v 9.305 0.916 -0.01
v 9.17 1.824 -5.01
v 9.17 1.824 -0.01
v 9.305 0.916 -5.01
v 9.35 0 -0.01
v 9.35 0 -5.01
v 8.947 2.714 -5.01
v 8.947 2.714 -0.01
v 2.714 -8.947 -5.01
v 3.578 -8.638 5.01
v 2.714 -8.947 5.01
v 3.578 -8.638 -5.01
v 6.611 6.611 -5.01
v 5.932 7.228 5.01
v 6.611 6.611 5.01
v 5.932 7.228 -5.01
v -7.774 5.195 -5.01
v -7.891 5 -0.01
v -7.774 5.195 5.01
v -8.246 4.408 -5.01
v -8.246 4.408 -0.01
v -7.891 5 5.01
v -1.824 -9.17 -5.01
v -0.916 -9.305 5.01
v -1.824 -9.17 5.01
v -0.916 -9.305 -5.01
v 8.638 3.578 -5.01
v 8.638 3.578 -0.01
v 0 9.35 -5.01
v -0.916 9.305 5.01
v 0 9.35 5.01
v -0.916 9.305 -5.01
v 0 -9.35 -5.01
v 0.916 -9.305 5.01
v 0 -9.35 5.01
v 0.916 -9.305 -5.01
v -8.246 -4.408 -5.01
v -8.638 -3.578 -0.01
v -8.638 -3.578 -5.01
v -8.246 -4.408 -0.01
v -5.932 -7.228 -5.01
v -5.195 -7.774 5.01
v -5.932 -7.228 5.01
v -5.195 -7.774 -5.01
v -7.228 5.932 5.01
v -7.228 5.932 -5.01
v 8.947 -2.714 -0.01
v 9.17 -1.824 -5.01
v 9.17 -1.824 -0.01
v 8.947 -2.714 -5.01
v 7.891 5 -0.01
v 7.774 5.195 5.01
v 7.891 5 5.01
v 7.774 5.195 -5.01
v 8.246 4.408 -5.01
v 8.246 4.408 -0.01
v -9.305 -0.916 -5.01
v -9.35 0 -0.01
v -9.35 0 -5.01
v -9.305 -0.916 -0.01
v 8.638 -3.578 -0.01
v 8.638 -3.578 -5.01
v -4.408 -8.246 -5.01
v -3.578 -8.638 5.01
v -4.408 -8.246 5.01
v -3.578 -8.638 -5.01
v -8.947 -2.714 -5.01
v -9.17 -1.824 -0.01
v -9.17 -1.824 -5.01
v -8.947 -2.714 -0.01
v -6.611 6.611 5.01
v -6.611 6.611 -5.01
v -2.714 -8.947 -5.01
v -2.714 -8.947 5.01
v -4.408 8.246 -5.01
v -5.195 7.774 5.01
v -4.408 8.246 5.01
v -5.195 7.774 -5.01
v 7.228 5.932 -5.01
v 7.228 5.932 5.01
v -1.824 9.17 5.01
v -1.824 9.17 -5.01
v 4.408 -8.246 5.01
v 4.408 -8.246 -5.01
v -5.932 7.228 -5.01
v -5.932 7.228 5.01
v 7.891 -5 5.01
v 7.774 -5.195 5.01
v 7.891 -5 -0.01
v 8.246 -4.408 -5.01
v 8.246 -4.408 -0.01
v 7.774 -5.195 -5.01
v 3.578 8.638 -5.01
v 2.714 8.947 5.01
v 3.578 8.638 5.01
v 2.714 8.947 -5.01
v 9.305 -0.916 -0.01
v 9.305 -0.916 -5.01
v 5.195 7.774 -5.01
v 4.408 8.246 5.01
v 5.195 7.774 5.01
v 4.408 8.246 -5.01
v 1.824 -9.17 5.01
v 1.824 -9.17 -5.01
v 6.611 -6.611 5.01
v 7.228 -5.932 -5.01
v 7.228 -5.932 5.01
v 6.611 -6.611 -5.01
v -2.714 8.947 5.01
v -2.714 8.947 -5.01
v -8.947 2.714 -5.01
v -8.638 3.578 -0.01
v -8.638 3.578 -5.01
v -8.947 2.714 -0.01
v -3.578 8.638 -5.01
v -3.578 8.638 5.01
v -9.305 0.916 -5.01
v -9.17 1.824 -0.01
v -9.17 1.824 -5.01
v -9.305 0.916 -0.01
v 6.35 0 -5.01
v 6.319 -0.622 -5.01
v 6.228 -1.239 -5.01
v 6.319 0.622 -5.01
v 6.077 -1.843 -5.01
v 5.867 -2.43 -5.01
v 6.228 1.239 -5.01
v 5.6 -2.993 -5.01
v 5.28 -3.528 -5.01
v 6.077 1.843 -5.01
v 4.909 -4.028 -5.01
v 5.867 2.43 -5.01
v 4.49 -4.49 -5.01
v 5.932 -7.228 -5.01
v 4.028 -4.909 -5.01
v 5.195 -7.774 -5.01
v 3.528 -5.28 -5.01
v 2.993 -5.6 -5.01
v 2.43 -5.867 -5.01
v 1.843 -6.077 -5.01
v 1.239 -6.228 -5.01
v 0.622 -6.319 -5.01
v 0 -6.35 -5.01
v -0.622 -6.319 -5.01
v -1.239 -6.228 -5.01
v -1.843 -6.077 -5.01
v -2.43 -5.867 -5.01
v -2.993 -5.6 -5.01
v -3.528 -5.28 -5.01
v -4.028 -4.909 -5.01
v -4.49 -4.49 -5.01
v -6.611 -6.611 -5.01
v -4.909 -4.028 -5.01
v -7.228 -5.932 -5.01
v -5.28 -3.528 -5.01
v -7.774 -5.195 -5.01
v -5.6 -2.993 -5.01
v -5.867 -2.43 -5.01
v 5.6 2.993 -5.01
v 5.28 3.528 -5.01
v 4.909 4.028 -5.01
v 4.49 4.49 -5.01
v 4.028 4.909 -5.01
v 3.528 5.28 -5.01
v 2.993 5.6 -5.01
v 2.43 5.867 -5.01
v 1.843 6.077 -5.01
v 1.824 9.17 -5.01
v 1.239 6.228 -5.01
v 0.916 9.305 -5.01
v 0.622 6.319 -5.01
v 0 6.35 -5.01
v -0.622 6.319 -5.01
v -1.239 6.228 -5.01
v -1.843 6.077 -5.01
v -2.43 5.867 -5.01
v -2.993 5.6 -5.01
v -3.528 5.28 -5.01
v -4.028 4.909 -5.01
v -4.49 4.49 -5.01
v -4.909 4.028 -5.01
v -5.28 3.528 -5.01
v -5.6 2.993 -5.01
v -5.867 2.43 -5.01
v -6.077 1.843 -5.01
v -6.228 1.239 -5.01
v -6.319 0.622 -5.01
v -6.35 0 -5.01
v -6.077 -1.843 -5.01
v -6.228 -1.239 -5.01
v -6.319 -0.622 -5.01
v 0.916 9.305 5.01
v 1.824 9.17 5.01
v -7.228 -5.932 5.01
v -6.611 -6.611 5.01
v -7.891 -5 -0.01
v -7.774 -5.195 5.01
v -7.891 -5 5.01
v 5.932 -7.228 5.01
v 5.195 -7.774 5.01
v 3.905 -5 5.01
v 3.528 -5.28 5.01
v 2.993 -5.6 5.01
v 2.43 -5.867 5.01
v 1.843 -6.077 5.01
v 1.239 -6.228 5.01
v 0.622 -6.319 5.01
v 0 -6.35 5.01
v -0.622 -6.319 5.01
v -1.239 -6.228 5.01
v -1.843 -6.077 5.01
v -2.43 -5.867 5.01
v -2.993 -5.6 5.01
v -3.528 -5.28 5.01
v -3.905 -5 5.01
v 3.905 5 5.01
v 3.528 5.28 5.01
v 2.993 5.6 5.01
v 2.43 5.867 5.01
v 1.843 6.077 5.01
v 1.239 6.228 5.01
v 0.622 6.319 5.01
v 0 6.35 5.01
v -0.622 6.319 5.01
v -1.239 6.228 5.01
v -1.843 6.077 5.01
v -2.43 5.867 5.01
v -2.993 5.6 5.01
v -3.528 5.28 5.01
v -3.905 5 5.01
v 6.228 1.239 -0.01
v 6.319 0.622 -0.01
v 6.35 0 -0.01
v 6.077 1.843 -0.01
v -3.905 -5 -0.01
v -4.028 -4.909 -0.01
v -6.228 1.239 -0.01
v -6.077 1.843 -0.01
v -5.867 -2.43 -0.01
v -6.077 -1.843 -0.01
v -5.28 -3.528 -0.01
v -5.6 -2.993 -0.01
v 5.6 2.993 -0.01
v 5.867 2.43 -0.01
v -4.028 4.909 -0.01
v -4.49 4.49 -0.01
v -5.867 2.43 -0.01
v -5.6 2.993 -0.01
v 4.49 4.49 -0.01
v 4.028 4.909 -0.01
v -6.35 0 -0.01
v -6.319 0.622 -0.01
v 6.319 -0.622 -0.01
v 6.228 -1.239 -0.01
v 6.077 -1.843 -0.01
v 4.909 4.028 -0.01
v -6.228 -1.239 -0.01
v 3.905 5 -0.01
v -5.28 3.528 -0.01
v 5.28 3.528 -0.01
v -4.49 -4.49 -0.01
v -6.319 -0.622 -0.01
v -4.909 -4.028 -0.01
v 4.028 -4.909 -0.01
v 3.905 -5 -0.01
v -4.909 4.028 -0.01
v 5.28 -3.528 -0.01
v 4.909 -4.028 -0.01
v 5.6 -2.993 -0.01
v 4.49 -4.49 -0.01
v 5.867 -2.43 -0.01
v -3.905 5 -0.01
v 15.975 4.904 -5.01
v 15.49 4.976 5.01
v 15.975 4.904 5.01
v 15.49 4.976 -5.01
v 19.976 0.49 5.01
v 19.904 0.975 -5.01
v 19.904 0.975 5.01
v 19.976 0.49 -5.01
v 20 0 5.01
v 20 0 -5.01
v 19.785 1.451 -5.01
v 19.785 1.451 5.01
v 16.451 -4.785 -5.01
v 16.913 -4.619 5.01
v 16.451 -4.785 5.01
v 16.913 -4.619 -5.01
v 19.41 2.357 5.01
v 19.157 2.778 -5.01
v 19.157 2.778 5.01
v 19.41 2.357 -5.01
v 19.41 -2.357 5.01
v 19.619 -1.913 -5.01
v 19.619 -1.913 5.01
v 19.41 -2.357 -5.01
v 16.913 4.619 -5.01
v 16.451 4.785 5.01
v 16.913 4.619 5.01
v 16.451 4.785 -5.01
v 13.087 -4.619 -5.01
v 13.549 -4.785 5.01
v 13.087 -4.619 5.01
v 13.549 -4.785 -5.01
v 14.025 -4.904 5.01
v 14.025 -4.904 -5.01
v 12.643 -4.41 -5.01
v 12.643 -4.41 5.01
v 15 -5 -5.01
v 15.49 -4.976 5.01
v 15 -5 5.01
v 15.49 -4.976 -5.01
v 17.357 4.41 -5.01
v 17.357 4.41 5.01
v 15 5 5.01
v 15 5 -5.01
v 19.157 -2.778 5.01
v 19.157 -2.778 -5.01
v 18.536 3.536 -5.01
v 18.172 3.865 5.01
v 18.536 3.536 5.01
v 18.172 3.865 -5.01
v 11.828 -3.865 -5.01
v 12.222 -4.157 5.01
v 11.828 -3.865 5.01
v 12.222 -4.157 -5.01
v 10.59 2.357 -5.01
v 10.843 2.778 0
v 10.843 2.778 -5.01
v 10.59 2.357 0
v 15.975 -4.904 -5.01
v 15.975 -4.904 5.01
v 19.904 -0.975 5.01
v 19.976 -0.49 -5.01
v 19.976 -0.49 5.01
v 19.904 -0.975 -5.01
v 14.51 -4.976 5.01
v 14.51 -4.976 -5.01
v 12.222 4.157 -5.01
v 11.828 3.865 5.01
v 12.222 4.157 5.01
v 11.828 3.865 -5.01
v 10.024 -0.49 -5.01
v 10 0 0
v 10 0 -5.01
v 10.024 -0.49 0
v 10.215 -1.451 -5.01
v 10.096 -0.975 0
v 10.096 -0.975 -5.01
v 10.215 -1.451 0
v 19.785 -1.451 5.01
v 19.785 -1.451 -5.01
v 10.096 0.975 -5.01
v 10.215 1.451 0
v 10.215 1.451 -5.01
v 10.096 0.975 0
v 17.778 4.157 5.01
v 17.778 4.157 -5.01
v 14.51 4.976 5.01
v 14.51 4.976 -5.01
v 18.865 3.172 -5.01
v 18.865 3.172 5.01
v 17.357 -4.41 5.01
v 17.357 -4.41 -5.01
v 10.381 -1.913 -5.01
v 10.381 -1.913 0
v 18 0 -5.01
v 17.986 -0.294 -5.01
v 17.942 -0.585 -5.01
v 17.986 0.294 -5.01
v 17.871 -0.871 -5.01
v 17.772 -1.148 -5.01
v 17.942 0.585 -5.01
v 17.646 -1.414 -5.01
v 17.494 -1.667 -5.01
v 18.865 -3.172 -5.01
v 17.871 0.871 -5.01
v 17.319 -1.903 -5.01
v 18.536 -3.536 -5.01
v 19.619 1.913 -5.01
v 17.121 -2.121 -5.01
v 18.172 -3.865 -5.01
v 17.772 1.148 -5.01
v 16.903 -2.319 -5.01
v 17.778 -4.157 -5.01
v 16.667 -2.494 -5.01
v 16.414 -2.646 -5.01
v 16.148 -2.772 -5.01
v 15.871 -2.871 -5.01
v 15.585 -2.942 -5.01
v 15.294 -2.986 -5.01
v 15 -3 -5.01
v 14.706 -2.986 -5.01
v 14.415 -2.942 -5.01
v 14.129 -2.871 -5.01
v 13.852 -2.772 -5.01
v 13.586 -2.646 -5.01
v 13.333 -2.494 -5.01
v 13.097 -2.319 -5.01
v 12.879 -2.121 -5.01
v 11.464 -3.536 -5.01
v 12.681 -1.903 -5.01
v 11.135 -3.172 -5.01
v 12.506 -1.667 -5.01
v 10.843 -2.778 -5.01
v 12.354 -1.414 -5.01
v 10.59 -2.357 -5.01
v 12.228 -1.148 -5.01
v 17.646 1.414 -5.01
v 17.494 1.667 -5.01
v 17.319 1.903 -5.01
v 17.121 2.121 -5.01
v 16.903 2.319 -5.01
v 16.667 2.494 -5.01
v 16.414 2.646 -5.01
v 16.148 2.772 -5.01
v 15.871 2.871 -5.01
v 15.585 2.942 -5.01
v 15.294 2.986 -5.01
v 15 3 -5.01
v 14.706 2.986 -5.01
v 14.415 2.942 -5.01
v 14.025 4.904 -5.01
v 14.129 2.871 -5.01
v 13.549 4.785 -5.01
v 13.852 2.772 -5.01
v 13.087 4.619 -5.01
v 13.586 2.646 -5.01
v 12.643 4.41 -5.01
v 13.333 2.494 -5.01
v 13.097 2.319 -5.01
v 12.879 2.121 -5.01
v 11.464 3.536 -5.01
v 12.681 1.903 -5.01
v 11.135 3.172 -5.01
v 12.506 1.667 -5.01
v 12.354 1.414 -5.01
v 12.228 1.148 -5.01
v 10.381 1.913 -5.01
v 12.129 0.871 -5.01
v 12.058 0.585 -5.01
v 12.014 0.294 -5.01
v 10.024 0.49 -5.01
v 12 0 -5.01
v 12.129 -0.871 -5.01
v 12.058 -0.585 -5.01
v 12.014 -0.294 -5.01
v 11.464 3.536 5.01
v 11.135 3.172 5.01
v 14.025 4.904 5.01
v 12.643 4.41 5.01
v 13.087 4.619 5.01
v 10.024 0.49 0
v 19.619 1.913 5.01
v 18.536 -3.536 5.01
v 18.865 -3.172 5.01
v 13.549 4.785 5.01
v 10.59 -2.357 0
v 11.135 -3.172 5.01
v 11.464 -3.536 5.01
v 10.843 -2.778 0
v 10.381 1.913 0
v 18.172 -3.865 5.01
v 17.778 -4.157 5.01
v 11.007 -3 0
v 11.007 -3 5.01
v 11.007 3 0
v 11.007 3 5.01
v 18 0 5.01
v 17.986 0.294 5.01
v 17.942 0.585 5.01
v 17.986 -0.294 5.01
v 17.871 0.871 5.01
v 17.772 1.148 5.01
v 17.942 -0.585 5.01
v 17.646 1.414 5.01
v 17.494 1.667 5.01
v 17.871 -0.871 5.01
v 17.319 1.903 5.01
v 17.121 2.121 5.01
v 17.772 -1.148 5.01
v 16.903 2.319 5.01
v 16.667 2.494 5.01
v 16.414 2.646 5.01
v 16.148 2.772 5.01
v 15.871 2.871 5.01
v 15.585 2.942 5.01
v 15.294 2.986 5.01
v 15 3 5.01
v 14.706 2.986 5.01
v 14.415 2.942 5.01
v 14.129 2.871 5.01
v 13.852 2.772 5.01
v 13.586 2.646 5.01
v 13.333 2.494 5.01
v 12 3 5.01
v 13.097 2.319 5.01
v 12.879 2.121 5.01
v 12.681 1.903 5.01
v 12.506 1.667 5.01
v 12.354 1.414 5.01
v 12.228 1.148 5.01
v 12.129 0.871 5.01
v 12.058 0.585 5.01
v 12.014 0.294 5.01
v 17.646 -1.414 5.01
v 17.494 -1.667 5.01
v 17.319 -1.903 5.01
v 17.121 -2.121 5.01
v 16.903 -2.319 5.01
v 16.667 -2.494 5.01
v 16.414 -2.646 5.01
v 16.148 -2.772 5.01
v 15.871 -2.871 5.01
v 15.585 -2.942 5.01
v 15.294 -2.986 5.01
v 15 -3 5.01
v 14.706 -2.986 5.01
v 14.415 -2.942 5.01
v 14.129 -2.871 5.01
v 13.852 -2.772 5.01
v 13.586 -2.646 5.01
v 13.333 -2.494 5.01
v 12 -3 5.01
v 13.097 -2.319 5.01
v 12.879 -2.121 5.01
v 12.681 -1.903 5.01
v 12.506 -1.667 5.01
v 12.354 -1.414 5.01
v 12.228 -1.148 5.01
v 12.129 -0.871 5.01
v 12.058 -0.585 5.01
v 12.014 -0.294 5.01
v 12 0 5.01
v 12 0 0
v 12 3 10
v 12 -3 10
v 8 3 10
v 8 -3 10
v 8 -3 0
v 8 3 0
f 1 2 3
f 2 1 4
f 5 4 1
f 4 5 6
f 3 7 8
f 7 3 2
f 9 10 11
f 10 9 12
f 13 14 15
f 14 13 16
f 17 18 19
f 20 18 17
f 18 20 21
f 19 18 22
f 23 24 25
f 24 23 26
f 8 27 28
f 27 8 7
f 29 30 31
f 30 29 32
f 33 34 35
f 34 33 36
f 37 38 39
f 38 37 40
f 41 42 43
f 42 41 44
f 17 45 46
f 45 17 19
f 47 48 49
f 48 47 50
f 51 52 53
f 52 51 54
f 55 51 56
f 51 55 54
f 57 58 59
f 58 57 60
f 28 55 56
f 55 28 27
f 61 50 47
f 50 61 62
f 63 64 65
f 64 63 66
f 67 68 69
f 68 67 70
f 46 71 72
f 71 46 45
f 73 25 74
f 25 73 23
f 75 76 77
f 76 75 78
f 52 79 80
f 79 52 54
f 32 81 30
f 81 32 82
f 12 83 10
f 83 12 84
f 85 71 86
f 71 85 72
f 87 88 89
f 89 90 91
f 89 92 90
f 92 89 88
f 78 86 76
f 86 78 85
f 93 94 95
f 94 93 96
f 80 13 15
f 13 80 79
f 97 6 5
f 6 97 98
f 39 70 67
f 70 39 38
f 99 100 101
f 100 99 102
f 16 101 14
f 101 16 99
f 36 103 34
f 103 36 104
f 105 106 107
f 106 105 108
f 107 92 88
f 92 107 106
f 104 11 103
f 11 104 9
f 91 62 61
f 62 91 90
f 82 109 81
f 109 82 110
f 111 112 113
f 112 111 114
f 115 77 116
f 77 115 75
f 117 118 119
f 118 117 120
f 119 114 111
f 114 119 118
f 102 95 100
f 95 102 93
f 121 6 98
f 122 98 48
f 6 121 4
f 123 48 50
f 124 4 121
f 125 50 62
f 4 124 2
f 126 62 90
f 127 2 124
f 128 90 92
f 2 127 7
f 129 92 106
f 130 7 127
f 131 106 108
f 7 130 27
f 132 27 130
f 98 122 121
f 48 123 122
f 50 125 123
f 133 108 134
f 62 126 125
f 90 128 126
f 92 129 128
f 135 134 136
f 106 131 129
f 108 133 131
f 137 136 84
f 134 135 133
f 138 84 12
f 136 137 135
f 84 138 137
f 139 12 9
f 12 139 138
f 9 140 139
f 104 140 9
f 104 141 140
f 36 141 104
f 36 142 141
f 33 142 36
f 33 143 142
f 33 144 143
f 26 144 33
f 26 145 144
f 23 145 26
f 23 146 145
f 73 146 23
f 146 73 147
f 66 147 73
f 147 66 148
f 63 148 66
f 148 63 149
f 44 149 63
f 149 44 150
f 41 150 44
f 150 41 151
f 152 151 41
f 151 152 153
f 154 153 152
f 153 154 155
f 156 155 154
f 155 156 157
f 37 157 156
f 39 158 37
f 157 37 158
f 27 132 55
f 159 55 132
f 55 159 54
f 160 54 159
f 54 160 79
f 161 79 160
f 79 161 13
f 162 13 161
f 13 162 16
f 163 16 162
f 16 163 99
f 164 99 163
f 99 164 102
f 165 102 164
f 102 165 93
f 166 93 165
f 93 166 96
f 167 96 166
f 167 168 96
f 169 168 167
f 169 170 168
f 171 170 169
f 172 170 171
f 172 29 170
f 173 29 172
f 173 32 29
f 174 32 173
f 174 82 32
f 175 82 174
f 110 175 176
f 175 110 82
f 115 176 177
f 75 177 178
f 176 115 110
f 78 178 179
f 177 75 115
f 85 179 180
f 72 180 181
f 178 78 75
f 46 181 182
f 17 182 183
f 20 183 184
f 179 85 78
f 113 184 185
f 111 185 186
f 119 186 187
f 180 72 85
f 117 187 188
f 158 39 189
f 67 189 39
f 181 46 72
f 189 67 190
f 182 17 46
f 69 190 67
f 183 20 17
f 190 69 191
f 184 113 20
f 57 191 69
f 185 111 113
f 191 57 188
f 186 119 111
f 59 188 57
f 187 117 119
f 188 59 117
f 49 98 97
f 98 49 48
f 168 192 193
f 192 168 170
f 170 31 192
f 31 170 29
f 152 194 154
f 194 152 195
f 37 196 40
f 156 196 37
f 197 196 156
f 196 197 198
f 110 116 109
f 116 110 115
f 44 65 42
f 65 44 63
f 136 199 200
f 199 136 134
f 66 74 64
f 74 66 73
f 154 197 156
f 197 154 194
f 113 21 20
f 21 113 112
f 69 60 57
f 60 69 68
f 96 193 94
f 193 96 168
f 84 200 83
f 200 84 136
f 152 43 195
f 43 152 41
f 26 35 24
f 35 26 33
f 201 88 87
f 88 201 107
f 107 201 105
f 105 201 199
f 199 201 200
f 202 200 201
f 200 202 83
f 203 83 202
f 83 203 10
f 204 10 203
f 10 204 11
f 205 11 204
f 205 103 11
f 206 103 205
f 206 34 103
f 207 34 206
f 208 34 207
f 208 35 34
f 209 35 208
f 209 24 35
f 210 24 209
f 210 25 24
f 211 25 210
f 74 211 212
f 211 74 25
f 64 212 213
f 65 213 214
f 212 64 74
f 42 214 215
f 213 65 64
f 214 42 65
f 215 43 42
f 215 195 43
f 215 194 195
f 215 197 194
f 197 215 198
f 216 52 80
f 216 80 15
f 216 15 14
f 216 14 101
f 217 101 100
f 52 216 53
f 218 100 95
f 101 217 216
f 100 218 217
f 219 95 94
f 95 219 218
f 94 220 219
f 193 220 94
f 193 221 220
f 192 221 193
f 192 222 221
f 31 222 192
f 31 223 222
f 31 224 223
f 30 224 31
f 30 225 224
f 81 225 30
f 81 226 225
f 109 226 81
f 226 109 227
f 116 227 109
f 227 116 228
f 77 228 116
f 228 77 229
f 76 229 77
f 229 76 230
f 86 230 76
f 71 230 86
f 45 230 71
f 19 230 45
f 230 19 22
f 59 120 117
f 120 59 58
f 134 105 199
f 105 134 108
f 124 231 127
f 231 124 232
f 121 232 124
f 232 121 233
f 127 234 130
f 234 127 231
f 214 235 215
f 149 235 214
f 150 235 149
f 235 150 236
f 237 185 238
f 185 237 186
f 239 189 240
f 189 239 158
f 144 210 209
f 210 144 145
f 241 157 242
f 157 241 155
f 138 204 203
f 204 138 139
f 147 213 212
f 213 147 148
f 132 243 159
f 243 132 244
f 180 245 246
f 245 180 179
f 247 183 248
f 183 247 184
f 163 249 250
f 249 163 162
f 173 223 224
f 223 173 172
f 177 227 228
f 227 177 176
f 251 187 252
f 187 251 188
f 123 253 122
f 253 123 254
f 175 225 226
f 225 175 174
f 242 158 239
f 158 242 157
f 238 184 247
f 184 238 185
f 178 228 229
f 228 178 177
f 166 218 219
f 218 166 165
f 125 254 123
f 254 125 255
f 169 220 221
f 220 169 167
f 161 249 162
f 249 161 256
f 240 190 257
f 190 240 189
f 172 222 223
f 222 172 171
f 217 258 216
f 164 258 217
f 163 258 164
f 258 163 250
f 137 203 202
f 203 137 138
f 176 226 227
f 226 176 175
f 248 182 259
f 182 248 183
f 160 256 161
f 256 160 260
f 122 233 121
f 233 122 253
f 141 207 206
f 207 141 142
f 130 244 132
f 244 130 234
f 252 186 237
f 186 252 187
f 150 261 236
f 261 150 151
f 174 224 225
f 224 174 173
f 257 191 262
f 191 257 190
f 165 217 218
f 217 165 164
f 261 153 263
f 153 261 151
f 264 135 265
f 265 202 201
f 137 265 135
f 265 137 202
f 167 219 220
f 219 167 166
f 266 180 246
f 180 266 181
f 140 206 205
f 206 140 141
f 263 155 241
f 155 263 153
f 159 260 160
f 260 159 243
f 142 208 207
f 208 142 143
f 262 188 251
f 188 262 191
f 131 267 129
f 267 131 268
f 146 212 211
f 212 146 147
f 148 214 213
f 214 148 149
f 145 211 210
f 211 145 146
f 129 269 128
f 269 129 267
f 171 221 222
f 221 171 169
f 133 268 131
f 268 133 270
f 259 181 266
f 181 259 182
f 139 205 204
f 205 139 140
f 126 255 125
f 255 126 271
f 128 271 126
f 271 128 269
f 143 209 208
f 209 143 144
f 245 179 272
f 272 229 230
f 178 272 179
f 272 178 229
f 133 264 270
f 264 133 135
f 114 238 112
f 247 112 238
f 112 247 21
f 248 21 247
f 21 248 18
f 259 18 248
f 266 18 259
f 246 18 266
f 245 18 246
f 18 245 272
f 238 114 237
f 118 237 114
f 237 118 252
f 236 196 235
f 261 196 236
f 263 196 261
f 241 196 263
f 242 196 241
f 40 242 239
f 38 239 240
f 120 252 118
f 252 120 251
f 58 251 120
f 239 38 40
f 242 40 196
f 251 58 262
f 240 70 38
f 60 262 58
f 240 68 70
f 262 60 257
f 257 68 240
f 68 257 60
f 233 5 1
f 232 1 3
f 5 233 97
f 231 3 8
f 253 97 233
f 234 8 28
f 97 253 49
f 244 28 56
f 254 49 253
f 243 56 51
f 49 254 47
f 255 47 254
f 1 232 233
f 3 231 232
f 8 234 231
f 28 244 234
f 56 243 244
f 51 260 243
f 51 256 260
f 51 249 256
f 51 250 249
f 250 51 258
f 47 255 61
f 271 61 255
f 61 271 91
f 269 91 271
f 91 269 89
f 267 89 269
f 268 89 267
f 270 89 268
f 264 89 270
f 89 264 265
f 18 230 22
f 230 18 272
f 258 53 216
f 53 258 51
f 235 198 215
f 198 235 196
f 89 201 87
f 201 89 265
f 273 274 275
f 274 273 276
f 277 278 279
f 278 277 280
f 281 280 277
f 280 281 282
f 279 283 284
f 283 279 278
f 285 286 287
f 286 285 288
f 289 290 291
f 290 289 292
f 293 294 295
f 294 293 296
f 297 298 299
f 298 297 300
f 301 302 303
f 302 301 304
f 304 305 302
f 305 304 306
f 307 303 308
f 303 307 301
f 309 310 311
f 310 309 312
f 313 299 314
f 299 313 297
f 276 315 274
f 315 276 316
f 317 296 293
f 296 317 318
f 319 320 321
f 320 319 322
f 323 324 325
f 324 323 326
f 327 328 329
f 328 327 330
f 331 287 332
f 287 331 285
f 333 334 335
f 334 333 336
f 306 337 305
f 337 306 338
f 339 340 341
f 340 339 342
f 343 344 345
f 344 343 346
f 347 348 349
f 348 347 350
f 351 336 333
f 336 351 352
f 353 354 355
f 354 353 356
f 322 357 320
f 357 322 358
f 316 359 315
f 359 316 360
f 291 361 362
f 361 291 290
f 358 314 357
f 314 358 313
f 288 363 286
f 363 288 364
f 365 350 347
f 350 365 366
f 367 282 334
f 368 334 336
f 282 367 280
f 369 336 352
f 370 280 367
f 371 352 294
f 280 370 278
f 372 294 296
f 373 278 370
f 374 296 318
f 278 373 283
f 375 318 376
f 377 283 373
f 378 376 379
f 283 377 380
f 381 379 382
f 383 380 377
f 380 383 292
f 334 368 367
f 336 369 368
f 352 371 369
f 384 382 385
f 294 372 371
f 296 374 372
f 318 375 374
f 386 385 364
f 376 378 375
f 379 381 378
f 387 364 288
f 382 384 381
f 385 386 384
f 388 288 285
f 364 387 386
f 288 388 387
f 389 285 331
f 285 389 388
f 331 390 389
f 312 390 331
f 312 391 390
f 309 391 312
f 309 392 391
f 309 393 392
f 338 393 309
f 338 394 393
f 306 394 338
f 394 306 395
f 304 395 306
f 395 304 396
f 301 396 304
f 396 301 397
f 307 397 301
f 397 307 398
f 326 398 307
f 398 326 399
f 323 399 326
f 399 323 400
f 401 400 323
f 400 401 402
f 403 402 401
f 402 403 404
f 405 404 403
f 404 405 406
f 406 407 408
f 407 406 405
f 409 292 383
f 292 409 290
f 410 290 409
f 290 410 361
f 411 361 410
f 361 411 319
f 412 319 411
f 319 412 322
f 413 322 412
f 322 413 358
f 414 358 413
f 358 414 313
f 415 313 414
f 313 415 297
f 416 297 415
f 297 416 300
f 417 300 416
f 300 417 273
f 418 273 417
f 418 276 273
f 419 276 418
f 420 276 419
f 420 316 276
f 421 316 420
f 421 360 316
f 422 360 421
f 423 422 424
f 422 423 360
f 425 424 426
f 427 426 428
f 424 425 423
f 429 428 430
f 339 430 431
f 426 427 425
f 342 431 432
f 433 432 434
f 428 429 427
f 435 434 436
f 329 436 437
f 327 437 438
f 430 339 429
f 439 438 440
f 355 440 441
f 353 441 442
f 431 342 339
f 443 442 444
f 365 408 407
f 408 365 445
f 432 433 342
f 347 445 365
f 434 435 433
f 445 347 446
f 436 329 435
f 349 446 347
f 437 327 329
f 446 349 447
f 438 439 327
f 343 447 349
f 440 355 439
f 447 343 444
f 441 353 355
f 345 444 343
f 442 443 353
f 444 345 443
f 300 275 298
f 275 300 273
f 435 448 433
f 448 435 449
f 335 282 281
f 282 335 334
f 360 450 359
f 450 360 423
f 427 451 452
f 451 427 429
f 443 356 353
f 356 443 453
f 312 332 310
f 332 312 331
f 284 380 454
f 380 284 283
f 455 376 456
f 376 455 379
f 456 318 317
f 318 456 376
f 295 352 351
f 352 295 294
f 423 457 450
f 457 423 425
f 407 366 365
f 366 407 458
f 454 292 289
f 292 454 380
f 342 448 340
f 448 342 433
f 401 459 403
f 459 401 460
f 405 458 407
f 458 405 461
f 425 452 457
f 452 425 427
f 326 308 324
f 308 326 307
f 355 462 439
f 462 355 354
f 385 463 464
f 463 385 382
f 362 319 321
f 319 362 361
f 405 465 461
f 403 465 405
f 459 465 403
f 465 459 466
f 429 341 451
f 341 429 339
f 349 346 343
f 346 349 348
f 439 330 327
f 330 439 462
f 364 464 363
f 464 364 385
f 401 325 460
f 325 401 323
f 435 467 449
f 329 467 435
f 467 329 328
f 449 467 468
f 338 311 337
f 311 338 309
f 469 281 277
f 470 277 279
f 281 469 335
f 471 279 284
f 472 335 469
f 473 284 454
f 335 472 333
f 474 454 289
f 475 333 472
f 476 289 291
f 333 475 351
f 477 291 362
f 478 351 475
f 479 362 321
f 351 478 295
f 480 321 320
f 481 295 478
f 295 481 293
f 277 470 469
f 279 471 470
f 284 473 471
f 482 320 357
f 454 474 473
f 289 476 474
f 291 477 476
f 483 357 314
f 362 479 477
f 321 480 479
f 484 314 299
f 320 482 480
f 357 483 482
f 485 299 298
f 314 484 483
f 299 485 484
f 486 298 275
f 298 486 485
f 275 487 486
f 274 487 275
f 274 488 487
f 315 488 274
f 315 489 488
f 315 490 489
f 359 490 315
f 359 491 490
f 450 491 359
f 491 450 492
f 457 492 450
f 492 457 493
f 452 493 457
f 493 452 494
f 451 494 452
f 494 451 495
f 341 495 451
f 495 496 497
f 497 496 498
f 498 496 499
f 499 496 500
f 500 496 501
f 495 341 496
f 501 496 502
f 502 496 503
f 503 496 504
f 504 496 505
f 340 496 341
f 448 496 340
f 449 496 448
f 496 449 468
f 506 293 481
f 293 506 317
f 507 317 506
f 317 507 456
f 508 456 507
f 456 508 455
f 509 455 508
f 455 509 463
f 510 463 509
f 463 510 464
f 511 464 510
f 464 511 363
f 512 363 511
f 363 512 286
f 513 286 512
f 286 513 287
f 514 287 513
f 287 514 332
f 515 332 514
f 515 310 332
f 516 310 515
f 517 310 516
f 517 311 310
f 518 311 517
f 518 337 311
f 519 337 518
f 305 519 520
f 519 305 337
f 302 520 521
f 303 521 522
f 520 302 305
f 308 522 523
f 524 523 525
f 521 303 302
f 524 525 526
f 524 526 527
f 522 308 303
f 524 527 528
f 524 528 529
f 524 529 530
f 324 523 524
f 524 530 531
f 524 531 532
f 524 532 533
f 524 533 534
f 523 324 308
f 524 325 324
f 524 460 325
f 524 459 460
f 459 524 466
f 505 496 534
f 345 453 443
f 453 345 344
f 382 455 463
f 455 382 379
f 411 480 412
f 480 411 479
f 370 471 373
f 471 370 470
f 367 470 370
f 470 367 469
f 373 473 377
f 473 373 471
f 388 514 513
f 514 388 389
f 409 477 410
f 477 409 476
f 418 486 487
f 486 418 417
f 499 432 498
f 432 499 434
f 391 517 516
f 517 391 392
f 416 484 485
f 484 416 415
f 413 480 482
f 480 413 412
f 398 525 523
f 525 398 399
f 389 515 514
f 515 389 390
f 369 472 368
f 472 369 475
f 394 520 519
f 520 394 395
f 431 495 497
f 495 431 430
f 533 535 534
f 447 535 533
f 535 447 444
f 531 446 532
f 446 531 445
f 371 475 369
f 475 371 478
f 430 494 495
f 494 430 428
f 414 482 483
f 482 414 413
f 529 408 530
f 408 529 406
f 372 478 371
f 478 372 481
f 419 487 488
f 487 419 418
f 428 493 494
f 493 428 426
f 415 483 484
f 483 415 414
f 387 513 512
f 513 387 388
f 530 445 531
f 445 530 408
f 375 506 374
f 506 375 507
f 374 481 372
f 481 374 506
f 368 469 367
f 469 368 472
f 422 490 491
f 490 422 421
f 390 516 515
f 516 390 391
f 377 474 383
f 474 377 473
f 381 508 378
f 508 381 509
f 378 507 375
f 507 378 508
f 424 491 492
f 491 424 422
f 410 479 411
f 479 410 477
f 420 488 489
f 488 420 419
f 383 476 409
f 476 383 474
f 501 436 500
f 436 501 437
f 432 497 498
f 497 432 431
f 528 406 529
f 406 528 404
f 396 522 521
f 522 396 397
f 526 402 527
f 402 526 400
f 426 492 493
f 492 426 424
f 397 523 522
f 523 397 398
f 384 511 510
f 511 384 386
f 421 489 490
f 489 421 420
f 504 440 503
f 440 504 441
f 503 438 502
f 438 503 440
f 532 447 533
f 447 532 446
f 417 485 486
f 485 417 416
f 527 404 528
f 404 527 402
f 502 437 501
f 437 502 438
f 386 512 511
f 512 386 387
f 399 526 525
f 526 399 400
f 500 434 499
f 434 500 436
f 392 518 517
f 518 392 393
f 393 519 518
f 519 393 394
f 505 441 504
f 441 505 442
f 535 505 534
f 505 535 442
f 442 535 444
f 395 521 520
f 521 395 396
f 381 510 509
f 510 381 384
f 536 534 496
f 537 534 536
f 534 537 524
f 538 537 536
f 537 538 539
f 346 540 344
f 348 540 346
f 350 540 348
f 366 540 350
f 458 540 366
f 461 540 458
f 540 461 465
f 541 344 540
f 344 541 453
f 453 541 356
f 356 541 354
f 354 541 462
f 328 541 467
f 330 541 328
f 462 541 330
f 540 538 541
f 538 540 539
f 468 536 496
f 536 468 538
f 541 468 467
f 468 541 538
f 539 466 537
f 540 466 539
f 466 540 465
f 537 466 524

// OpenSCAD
$fn = 64;

// Dimensions
rod_id = 12.7;        // inner diameter of rod ring (mm)
rod_wall = 3;         // wall thickness of rod ring (mm)
rod_od = rod_id + 2 * rod_wall;  // outer diameter of rod ring (mm)
rod_opening_width = 10;  // width of opening cut from -X side (mm)

tubing_id = 6;        // inner diameter of tubing ring (mm)
tubing_wall = 2;      // wall thickness of tubing ring (mm)
tubing_od = tubing_id + 2 * tubing_wall;  // outer diameter of tubing ring (mm)
tubing_opening_width = 4.5;  // width of opening cut from +X side (mm)

bridge_x_start = 8;   // start x-coordinate of bridge (mm)
bridge_x_end = 12;    // end x-coordinate of bridge (mm)
bridge_width = 6;     // width of bridge in Y-direction (mm)

// Height (Z) for extrusion
height = 10;

// Rod ring with opening
module rod_ring_with_opening() {
    difference() {
        // Outer circle
        cylinder(h = height + 0.02, r = rod_od / 2, center = true);
        // Inner circle (hole)
        cylinder(h = height + 0.02, r = rod_id / 2, center = true);
        // Opening cut: remove x < 0 and -5 < y < 5
        translate([-(rod_od + 10), -5, -0.01])
            cube([rod_od + 20, 10, height + 0.02]);
    }
}

// Tubing ring with opening
module tubing_ring_with_opening() {
    translate([15, 0, 0]) {
        difference() {
            // Outer circle
            cylinder(h = height + 0.02, r = tubing_od / 2, center = true);
            // Inner circle (hole)
            cylinder(h = height + 0.02, r = tubing_id / 2, center = true);
            // Opening cut: remove x > 15 and -2.25 < y < 2.25
            translate([15, 0, -0.01])
                cube([tubing_od + 10, tubing_opening_width, height + 0.02]);
        }
    }
}

// Solid bridge between rings
module bridge() {
    // Bridge is 6 mm wide in Y (from -3 to +3), from x=8 to x=12
    translate([bridge_x_start, -bridge_width / 2, 0])
        cube([bridge_x_end - bridge_x_start, bridge_width, height]);
}

// Assemble the clip
rod_ring_with_opening();
tubing_ring_with_opening();
bridge();
